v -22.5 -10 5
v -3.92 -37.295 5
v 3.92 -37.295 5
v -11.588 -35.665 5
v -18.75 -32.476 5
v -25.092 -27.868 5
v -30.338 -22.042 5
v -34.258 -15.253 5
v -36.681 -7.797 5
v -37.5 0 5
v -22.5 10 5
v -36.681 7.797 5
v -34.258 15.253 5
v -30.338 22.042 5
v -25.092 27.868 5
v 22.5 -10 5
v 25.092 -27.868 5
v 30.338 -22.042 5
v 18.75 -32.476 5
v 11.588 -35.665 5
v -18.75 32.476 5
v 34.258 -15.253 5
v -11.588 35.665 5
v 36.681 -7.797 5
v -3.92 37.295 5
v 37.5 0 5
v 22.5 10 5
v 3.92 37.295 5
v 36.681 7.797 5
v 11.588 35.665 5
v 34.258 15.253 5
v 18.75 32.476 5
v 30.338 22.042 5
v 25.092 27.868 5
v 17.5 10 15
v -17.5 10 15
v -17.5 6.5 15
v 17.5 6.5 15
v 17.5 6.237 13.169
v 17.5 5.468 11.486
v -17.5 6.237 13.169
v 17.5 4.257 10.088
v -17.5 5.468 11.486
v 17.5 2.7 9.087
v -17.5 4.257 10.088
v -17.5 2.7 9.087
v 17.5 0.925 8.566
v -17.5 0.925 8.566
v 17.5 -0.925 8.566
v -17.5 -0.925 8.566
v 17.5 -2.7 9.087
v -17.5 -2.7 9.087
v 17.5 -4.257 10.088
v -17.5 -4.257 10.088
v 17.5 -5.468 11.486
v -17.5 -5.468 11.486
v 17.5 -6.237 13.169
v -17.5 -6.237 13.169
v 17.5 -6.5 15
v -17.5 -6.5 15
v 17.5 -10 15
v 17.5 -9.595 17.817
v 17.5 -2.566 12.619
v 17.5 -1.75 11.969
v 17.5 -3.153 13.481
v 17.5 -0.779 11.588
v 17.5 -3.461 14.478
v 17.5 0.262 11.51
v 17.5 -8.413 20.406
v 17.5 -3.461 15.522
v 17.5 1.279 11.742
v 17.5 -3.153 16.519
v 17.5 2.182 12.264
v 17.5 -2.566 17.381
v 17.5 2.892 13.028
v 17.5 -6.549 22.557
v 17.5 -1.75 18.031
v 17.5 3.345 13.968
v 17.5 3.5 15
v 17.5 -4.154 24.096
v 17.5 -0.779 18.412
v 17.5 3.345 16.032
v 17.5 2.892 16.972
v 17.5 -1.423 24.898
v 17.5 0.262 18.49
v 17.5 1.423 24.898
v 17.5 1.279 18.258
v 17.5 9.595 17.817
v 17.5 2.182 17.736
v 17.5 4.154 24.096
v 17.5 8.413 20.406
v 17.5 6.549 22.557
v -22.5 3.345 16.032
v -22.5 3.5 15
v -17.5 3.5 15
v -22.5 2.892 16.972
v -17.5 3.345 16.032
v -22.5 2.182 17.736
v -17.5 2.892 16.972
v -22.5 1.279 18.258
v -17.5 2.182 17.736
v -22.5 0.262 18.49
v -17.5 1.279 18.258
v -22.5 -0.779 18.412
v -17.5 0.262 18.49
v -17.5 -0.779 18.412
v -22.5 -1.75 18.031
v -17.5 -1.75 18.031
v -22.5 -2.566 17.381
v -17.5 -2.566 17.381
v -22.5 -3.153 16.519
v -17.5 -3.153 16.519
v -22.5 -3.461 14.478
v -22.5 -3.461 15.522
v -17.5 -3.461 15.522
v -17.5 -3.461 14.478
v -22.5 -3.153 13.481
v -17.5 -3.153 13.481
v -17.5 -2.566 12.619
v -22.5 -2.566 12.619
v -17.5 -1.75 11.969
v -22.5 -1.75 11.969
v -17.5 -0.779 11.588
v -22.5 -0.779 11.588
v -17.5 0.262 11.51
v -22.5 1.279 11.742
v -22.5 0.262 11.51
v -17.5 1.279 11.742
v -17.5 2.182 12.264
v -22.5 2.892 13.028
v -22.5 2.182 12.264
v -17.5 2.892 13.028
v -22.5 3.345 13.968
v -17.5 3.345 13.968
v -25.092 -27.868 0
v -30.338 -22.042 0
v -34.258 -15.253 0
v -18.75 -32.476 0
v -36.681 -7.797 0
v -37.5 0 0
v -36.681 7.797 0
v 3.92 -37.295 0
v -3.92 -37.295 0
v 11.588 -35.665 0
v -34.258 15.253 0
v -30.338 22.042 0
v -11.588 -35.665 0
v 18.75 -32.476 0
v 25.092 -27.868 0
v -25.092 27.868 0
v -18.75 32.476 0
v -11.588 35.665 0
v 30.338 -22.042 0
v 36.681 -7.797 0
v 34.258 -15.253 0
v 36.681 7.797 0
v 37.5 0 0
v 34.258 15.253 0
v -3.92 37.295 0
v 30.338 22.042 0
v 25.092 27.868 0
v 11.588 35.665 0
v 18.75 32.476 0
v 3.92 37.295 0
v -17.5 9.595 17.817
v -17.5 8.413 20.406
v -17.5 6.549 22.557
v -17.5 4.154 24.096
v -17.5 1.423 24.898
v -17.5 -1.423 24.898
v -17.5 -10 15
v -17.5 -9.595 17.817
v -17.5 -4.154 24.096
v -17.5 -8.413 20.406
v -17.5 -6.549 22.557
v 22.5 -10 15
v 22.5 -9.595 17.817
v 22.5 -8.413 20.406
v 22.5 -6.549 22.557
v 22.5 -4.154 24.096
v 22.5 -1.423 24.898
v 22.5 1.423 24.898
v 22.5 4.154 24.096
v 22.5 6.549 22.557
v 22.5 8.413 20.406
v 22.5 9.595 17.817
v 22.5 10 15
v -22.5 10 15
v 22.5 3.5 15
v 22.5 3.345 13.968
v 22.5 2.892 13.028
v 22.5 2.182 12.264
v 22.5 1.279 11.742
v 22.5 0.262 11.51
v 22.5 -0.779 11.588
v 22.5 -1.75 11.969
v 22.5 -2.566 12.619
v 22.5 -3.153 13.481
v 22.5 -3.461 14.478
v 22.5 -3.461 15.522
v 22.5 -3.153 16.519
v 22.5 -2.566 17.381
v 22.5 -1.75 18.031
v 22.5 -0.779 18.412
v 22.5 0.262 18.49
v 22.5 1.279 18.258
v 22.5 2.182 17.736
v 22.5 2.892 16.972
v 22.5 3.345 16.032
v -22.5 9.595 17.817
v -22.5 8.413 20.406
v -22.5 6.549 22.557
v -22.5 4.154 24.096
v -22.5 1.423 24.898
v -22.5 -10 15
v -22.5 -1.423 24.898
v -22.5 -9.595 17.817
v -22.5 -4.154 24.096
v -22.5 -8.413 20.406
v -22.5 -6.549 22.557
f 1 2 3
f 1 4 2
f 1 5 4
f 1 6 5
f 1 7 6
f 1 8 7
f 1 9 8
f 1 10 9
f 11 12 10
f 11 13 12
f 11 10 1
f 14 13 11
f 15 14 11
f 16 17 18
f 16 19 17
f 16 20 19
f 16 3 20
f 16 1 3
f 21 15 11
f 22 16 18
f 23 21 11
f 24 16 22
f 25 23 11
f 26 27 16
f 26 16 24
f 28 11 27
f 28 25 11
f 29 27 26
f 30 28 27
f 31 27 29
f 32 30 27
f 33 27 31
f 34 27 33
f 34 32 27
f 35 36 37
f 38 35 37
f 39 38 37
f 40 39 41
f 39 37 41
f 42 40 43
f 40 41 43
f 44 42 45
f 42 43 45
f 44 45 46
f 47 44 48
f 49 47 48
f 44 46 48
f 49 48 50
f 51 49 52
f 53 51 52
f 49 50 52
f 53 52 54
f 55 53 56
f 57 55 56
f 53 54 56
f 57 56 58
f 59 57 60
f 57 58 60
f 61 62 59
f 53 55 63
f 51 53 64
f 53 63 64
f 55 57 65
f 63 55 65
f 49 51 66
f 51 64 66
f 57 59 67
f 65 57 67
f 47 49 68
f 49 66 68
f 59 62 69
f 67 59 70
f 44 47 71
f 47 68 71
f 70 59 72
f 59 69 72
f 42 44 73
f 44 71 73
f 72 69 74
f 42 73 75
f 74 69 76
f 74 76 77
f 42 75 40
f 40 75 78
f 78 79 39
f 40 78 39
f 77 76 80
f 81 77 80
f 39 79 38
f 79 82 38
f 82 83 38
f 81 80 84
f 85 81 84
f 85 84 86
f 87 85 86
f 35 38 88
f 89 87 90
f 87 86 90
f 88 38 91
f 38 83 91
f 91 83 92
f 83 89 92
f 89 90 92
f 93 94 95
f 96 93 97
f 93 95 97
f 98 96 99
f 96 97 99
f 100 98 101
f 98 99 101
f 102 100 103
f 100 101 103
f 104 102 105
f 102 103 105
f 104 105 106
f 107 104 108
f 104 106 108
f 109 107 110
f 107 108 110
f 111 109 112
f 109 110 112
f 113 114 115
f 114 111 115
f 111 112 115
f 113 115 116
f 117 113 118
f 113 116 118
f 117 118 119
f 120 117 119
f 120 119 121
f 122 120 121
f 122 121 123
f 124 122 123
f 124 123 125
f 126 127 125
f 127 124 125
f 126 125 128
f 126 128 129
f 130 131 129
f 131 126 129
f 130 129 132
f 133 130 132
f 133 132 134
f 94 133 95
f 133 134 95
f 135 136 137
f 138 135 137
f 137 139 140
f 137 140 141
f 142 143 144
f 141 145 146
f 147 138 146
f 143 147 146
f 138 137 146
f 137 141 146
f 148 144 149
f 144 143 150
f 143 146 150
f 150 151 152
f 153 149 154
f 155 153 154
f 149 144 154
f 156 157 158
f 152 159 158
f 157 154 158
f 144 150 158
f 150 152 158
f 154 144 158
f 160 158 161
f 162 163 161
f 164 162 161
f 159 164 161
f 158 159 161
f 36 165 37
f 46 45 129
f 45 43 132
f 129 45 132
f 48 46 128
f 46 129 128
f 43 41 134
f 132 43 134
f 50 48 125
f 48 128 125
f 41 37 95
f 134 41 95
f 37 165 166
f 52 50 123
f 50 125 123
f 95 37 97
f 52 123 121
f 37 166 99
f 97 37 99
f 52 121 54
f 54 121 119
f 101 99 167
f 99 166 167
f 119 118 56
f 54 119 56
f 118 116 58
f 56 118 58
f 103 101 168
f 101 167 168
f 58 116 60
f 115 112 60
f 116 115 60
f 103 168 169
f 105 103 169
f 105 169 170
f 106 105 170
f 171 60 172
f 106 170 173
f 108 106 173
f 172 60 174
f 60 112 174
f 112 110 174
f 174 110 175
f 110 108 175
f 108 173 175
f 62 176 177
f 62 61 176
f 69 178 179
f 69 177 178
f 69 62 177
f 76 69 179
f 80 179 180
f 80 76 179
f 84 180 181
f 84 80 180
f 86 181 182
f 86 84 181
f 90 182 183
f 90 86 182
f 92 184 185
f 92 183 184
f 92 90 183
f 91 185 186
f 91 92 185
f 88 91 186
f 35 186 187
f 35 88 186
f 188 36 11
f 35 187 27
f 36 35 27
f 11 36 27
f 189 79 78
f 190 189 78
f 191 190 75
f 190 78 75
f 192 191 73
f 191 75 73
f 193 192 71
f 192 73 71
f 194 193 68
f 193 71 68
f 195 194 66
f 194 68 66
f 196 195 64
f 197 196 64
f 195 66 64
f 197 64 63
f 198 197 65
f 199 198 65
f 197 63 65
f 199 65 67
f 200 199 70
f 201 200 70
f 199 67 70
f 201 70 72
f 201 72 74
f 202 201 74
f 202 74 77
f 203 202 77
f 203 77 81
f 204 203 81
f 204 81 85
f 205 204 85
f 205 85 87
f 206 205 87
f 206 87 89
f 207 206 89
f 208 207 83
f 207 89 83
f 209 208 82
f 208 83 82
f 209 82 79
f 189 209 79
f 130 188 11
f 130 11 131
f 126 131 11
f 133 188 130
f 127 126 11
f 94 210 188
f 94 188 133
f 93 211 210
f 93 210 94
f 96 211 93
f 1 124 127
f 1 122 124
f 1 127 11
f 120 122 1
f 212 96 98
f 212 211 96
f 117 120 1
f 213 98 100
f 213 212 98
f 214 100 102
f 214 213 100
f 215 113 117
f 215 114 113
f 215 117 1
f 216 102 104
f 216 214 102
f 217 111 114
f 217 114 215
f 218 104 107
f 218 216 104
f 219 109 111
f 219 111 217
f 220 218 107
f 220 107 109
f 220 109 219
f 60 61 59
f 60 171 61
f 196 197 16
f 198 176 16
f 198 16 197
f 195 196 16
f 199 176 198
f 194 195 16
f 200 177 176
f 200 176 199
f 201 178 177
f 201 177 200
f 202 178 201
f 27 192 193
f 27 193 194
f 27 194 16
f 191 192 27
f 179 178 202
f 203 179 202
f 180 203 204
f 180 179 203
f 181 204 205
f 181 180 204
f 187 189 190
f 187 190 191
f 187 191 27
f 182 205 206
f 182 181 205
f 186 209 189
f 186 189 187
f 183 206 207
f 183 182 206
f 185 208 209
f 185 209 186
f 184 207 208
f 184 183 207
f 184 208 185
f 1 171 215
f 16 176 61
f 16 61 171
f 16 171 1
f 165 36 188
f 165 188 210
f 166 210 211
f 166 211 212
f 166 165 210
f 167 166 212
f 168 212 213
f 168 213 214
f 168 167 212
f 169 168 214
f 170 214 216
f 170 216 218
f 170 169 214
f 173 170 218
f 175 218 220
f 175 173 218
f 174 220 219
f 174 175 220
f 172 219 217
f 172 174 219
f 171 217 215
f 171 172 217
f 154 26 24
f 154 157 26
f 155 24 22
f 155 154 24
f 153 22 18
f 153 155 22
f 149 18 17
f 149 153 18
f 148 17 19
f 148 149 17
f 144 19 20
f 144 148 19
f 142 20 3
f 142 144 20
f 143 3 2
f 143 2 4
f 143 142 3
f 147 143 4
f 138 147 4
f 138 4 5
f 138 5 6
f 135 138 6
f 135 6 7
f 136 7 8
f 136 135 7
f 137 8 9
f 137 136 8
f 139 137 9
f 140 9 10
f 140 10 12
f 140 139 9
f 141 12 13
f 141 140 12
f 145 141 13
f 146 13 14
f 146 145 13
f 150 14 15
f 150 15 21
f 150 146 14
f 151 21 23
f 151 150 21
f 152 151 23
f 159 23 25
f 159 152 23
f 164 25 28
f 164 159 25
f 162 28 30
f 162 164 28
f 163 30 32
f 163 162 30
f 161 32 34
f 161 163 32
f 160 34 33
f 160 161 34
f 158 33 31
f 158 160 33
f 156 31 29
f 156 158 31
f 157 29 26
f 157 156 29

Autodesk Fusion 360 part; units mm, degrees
sketch "Sketch1" plane through (0, 0, 0) normal (0, 0, 1) x (1, 0, 0)
  circle A0 centre (0, 0) radius 37.5
  dimension "d1" = 75
extrude "Extrude1" add sketch "Sketch1" along normal blind 5
sketch "Sketch2" plane through (0, 0, 0) normal (1, 0, 0) x (0, 1, 0)
  line L0 (-6.5, 5) -> (-6.5, 15)
  line L1 (6.5, 5) -> (6.5, 15)
  circle A0 centre (0, 15) radius 6.5
  line L2 (0, 1.75) -> (0, 22.5)
  line L3 (37.5, 5) -> (-37.5, 5)
  line L4 (-10, 5) -> (-10, 15)
  circle A1 centre (0, 15) radius 10
  line L5 (10, 5) -> (10, 15)
  line L6 (-10, 15) -> (-6.5, 15)
  line L7 (10, 15) -> (6.5, 15)
  circle A2 centre (0, 15) radius 3.5
  dimension "d4" = 13
  dimension "d5" = 10
  dimension "d6" = 20
  dimension "d14" = 7
extrude "Extrude2" add sketch "Sketch2" along normal mid plane 35 contours L0 L3 L4 A1 | L0 L3 A1 | L0 A1 L6 | L0 A0 L2 A1 | L1 L3 A1 | L1 A0 L2 A1 | L1 L3 A1 L5 | L1 A1 L7
extrude "Extrude3" add sketch "Sketch2" along normal blind 5 from surface at 17.5 contours L0 L3 L4 A1 | L0 L3 A1 | L0 A1 L6 | L0 A0 L2 A1 | L1 L3 A1 | L1 A0 L2 A1 | A0 A1 L6 L7 | A0 L2 A2 | A0 L2 A2 | L1 L3 A1 L5 | L1 A1 L7
mirror "Mirror1" about plane through (0, 0, 0) normal (1, 0, 0) of "Extrude3"
sketch "Sketch3" plane through (0, 0, 0) normal (0, 1, 0) x (1, 0, 0)
sketch "Sketch4" plane through (0, 0, 5) normal (0, 0, 1) x (-1, 0, 0)
  circle A0 centre (0, 0) radius 37.5
  line L0 (-22.5, 10) -> (22.5, 10)
  line L1 (22.5, 10) -> (22.5, -10)
  line L2 (22.5, -10) -> (-22.5, -10)
  line L3 (-22.5, -10) -> (-22.5, 10)
  circle A1 centre (0, 32.5) radius 5
  line L4 (5, 32.5) -> (5, 37.1652)
  line L5 (-5, 32.5) -> (-5, 37.1652)
  dimension "d15" = 10
extrude "Extrude4" cut sketch "Sketch4" along normal through all contours A0 A1 L4 | A0 A1 L5 | A1
equation "d7 = ( 35 / 2 ) * 1 mm"
equation "d9 = ( 35 / 2 ) * 1 mm"
